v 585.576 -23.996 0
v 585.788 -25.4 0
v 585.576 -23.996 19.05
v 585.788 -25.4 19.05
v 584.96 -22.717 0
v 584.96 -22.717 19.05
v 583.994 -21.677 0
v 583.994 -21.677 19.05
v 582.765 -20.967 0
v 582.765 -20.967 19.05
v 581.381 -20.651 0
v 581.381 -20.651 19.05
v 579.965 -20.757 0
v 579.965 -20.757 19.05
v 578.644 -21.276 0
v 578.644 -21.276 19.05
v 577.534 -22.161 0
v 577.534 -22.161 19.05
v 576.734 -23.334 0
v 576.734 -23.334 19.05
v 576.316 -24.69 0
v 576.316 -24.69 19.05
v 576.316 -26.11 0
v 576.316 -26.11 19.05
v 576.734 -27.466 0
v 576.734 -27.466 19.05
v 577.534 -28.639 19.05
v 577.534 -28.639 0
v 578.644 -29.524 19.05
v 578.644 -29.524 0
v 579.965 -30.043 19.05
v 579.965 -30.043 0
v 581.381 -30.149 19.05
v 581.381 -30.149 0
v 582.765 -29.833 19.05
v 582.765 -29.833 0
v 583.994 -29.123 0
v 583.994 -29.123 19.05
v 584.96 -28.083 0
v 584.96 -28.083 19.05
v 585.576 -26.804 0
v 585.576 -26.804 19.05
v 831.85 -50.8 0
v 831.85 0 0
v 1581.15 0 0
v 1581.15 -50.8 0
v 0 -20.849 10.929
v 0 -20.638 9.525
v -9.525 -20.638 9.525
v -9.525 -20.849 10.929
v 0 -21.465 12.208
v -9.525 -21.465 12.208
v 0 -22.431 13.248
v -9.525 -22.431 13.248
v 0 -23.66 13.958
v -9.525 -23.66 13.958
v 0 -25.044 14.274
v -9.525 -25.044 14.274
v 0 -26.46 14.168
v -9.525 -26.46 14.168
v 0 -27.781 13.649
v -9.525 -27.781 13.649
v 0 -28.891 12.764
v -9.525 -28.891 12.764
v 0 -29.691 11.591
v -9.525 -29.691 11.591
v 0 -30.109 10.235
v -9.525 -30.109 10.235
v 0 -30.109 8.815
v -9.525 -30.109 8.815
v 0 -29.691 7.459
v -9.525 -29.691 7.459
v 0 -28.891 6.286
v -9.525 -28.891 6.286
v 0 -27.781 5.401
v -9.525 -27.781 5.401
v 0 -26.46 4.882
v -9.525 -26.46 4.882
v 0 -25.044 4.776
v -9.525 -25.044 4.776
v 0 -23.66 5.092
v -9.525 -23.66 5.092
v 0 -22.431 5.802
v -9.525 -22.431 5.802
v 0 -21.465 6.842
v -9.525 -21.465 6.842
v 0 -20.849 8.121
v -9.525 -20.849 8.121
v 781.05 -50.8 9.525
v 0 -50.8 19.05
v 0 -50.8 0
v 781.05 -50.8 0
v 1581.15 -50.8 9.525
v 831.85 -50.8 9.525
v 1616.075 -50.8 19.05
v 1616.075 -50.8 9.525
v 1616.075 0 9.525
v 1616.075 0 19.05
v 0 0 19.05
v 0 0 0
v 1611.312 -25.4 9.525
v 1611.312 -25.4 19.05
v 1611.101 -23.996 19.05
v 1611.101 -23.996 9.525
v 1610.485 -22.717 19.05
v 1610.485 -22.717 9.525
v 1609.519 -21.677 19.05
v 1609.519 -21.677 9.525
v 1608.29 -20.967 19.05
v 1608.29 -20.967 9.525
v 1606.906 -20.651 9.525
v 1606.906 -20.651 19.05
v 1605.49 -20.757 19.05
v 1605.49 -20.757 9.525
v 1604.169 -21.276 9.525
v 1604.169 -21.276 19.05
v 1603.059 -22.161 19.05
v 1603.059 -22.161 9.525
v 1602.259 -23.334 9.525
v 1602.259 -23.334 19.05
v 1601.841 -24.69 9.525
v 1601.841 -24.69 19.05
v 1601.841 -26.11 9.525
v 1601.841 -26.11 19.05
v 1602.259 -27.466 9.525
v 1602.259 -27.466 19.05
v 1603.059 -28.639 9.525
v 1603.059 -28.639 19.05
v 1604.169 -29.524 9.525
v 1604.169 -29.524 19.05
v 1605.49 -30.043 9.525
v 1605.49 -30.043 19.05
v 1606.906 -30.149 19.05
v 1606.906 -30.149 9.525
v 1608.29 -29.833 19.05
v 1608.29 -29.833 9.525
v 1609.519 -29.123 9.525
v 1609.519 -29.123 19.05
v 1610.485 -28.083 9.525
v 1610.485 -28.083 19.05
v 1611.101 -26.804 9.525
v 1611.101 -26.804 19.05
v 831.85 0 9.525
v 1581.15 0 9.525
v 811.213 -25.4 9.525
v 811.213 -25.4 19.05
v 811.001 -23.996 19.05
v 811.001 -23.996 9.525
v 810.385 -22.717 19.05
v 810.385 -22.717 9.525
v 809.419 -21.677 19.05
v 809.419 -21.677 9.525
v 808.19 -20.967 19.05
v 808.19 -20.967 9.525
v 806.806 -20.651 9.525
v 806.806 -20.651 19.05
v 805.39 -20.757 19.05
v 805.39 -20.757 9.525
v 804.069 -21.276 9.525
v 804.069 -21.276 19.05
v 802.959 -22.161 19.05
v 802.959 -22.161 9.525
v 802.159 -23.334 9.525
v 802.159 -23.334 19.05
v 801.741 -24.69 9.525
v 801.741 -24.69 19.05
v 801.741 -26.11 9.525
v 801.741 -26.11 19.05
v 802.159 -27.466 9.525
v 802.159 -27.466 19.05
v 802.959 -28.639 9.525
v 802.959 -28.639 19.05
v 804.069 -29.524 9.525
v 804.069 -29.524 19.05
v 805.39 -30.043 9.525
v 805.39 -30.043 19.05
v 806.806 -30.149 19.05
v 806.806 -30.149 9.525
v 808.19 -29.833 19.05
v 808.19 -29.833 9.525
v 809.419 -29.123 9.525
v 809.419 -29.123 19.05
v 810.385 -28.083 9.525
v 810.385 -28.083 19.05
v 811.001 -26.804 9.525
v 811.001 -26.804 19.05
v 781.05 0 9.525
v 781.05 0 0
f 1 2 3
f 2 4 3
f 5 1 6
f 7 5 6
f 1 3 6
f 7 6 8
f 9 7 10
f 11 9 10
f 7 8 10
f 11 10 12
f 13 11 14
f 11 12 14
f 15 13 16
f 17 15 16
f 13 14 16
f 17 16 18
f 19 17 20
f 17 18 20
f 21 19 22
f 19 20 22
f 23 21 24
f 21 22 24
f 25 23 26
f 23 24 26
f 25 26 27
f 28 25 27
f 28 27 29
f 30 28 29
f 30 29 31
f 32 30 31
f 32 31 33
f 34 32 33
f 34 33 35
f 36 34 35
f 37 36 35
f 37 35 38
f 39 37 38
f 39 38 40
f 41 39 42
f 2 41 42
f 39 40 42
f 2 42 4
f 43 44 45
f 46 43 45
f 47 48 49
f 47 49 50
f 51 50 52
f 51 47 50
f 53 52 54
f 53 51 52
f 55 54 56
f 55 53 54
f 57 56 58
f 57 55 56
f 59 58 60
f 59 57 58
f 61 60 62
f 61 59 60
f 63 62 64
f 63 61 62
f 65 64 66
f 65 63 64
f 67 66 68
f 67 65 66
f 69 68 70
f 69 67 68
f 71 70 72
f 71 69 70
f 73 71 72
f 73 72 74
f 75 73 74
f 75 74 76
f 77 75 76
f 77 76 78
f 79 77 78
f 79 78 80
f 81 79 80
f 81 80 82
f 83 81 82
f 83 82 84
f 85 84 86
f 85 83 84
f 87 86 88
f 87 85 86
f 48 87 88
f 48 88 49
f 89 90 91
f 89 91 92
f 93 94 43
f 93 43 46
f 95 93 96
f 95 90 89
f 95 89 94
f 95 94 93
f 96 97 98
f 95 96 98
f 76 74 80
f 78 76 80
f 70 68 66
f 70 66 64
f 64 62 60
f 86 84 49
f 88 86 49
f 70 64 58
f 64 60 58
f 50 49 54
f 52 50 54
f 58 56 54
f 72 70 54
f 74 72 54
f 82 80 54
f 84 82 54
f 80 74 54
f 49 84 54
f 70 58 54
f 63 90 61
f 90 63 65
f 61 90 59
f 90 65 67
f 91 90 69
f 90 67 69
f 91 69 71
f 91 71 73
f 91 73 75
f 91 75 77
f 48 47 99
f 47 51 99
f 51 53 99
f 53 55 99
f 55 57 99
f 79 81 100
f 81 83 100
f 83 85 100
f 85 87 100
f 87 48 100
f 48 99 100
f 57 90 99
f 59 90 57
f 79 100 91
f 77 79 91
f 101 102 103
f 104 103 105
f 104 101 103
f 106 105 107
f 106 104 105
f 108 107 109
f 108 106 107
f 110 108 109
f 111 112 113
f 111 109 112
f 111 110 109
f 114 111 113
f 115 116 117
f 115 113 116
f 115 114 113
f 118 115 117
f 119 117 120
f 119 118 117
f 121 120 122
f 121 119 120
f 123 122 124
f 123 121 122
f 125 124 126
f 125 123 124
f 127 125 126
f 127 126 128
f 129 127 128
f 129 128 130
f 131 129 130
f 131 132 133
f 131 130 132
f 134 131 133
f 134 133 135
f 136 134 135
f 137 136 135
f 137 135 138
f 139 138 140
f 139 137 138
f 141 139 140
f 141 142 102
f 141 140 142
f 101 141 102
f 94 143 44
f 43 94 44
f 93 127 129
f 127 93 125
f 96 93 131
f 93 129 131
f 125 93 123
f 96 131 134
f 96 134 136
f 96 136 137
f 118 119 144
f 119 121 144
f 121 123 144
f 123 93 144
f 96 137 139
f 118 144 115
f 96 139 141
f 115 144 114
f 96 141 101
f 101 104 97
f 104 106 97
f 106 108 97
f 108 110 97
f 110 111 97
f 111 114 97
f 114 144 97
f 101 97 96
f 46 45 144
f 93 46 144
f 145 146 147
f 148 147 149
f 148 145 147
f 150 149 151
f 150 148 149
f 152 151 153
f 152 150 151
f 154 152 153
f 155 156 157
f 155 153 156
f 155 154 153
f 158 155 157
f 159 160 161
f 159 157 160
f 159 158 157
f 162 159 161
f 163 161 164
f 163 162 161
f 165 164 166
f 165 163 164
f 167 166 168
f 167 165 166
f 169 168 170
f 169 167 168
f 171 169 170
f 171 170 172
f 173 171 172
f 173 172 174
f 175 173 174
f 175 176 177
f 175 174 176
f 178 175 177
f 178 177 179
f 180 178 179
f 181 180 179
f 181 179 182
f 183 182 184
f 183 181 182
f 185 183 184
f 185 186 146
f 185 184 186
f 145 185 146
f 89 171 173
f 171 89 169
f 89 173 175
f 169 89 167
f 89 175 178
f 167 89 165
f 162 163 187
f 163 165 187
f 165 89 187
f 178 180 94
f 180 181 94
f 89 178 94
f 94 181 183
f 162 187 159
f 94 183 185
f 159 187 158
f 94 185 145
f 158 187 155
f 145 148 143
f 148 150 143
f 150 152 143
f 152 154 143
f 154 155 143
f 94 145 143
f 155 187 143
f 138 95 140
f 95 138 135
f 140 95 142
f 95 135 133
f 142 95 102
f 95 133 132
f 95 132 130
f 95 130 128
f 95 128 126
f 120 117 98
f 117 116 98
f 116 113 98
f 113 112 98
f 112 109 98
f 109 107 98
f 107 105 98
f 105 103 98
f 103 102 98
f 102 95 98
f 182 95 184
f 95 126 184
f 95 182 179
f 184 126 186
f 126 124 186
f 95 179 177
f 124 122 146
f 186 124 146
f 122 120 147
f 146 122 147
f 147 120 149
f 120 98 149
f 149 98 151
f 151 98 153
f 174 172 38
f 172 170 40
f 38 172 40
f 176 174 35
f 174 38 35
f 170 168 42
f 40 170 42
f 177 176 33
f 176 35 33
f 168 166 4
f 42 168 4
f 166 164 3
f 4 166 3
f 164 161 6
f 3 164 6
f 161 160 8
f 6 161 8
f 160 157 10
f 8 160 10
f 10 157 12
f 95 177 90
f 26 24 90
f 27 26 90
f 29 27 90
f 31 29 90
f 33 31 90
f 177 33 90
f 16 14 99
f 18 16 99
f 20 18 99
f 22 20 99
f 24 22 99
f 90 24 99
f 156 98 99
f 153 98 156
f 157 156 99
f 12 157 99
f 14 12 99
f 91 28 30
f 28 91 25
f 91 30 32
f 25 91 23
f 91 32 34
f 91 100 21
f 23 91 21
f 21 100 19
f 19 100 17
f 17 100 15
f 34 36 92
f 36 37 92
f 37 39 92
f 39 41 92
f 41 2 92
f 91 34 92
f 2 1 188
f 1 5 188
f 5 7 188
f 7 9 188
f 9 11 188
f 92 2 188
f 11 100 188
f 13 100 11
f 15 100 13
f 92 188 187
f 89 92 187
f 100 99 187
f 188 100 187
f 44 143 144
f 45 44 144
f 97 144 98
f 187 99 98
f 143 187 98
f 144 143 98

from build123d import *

# Parameters (mm, degrees)
F1_DEPTH = 50.8
F3_R     = 4.7625
F4_DEPTH = 12.7
F5_R     = 4.7625
F6_DEPTH = 9.525


with BuildPart() as f1:
    # F0 (on Front) → F1 (new body)
    with BuildSketch(Plane.XZ):
        Polygon((1616.075, 9.525), (1616.075, 19.05), (0, 19.05), (0, 0), (781.05, 0), (781.05, 9.525), (831.85, 9.525), (831.85, 0), (1581.15, 0), (1581.15, 9.525), align=None)
    extrude(amount=F1_DEPTH)

    # F3 (on offset) → F4 (cut, symmetric)
    with BuildSketch(Plane.XY.offset(9.525)):
        with Locations((806.45, -25.4)):
            Circle(F3_R)
        with Locations((1606.55, -25.4)):
            Circle(F3_R)
        with Locations((581.025, -25.4)):
            Circle(F3_R)
    extrude(amount=F4_DEPTH, both=True, mode=Mode.SUBTRACT)

    # F5 (on Right) → F6 (join)
    with BuildSketch(Plane.YZ):
        with Locations((-25.4, 9.525)):
            Circle(F5_R)
    extrude(amount=-F6_DEPTH)


solid = f1.part
